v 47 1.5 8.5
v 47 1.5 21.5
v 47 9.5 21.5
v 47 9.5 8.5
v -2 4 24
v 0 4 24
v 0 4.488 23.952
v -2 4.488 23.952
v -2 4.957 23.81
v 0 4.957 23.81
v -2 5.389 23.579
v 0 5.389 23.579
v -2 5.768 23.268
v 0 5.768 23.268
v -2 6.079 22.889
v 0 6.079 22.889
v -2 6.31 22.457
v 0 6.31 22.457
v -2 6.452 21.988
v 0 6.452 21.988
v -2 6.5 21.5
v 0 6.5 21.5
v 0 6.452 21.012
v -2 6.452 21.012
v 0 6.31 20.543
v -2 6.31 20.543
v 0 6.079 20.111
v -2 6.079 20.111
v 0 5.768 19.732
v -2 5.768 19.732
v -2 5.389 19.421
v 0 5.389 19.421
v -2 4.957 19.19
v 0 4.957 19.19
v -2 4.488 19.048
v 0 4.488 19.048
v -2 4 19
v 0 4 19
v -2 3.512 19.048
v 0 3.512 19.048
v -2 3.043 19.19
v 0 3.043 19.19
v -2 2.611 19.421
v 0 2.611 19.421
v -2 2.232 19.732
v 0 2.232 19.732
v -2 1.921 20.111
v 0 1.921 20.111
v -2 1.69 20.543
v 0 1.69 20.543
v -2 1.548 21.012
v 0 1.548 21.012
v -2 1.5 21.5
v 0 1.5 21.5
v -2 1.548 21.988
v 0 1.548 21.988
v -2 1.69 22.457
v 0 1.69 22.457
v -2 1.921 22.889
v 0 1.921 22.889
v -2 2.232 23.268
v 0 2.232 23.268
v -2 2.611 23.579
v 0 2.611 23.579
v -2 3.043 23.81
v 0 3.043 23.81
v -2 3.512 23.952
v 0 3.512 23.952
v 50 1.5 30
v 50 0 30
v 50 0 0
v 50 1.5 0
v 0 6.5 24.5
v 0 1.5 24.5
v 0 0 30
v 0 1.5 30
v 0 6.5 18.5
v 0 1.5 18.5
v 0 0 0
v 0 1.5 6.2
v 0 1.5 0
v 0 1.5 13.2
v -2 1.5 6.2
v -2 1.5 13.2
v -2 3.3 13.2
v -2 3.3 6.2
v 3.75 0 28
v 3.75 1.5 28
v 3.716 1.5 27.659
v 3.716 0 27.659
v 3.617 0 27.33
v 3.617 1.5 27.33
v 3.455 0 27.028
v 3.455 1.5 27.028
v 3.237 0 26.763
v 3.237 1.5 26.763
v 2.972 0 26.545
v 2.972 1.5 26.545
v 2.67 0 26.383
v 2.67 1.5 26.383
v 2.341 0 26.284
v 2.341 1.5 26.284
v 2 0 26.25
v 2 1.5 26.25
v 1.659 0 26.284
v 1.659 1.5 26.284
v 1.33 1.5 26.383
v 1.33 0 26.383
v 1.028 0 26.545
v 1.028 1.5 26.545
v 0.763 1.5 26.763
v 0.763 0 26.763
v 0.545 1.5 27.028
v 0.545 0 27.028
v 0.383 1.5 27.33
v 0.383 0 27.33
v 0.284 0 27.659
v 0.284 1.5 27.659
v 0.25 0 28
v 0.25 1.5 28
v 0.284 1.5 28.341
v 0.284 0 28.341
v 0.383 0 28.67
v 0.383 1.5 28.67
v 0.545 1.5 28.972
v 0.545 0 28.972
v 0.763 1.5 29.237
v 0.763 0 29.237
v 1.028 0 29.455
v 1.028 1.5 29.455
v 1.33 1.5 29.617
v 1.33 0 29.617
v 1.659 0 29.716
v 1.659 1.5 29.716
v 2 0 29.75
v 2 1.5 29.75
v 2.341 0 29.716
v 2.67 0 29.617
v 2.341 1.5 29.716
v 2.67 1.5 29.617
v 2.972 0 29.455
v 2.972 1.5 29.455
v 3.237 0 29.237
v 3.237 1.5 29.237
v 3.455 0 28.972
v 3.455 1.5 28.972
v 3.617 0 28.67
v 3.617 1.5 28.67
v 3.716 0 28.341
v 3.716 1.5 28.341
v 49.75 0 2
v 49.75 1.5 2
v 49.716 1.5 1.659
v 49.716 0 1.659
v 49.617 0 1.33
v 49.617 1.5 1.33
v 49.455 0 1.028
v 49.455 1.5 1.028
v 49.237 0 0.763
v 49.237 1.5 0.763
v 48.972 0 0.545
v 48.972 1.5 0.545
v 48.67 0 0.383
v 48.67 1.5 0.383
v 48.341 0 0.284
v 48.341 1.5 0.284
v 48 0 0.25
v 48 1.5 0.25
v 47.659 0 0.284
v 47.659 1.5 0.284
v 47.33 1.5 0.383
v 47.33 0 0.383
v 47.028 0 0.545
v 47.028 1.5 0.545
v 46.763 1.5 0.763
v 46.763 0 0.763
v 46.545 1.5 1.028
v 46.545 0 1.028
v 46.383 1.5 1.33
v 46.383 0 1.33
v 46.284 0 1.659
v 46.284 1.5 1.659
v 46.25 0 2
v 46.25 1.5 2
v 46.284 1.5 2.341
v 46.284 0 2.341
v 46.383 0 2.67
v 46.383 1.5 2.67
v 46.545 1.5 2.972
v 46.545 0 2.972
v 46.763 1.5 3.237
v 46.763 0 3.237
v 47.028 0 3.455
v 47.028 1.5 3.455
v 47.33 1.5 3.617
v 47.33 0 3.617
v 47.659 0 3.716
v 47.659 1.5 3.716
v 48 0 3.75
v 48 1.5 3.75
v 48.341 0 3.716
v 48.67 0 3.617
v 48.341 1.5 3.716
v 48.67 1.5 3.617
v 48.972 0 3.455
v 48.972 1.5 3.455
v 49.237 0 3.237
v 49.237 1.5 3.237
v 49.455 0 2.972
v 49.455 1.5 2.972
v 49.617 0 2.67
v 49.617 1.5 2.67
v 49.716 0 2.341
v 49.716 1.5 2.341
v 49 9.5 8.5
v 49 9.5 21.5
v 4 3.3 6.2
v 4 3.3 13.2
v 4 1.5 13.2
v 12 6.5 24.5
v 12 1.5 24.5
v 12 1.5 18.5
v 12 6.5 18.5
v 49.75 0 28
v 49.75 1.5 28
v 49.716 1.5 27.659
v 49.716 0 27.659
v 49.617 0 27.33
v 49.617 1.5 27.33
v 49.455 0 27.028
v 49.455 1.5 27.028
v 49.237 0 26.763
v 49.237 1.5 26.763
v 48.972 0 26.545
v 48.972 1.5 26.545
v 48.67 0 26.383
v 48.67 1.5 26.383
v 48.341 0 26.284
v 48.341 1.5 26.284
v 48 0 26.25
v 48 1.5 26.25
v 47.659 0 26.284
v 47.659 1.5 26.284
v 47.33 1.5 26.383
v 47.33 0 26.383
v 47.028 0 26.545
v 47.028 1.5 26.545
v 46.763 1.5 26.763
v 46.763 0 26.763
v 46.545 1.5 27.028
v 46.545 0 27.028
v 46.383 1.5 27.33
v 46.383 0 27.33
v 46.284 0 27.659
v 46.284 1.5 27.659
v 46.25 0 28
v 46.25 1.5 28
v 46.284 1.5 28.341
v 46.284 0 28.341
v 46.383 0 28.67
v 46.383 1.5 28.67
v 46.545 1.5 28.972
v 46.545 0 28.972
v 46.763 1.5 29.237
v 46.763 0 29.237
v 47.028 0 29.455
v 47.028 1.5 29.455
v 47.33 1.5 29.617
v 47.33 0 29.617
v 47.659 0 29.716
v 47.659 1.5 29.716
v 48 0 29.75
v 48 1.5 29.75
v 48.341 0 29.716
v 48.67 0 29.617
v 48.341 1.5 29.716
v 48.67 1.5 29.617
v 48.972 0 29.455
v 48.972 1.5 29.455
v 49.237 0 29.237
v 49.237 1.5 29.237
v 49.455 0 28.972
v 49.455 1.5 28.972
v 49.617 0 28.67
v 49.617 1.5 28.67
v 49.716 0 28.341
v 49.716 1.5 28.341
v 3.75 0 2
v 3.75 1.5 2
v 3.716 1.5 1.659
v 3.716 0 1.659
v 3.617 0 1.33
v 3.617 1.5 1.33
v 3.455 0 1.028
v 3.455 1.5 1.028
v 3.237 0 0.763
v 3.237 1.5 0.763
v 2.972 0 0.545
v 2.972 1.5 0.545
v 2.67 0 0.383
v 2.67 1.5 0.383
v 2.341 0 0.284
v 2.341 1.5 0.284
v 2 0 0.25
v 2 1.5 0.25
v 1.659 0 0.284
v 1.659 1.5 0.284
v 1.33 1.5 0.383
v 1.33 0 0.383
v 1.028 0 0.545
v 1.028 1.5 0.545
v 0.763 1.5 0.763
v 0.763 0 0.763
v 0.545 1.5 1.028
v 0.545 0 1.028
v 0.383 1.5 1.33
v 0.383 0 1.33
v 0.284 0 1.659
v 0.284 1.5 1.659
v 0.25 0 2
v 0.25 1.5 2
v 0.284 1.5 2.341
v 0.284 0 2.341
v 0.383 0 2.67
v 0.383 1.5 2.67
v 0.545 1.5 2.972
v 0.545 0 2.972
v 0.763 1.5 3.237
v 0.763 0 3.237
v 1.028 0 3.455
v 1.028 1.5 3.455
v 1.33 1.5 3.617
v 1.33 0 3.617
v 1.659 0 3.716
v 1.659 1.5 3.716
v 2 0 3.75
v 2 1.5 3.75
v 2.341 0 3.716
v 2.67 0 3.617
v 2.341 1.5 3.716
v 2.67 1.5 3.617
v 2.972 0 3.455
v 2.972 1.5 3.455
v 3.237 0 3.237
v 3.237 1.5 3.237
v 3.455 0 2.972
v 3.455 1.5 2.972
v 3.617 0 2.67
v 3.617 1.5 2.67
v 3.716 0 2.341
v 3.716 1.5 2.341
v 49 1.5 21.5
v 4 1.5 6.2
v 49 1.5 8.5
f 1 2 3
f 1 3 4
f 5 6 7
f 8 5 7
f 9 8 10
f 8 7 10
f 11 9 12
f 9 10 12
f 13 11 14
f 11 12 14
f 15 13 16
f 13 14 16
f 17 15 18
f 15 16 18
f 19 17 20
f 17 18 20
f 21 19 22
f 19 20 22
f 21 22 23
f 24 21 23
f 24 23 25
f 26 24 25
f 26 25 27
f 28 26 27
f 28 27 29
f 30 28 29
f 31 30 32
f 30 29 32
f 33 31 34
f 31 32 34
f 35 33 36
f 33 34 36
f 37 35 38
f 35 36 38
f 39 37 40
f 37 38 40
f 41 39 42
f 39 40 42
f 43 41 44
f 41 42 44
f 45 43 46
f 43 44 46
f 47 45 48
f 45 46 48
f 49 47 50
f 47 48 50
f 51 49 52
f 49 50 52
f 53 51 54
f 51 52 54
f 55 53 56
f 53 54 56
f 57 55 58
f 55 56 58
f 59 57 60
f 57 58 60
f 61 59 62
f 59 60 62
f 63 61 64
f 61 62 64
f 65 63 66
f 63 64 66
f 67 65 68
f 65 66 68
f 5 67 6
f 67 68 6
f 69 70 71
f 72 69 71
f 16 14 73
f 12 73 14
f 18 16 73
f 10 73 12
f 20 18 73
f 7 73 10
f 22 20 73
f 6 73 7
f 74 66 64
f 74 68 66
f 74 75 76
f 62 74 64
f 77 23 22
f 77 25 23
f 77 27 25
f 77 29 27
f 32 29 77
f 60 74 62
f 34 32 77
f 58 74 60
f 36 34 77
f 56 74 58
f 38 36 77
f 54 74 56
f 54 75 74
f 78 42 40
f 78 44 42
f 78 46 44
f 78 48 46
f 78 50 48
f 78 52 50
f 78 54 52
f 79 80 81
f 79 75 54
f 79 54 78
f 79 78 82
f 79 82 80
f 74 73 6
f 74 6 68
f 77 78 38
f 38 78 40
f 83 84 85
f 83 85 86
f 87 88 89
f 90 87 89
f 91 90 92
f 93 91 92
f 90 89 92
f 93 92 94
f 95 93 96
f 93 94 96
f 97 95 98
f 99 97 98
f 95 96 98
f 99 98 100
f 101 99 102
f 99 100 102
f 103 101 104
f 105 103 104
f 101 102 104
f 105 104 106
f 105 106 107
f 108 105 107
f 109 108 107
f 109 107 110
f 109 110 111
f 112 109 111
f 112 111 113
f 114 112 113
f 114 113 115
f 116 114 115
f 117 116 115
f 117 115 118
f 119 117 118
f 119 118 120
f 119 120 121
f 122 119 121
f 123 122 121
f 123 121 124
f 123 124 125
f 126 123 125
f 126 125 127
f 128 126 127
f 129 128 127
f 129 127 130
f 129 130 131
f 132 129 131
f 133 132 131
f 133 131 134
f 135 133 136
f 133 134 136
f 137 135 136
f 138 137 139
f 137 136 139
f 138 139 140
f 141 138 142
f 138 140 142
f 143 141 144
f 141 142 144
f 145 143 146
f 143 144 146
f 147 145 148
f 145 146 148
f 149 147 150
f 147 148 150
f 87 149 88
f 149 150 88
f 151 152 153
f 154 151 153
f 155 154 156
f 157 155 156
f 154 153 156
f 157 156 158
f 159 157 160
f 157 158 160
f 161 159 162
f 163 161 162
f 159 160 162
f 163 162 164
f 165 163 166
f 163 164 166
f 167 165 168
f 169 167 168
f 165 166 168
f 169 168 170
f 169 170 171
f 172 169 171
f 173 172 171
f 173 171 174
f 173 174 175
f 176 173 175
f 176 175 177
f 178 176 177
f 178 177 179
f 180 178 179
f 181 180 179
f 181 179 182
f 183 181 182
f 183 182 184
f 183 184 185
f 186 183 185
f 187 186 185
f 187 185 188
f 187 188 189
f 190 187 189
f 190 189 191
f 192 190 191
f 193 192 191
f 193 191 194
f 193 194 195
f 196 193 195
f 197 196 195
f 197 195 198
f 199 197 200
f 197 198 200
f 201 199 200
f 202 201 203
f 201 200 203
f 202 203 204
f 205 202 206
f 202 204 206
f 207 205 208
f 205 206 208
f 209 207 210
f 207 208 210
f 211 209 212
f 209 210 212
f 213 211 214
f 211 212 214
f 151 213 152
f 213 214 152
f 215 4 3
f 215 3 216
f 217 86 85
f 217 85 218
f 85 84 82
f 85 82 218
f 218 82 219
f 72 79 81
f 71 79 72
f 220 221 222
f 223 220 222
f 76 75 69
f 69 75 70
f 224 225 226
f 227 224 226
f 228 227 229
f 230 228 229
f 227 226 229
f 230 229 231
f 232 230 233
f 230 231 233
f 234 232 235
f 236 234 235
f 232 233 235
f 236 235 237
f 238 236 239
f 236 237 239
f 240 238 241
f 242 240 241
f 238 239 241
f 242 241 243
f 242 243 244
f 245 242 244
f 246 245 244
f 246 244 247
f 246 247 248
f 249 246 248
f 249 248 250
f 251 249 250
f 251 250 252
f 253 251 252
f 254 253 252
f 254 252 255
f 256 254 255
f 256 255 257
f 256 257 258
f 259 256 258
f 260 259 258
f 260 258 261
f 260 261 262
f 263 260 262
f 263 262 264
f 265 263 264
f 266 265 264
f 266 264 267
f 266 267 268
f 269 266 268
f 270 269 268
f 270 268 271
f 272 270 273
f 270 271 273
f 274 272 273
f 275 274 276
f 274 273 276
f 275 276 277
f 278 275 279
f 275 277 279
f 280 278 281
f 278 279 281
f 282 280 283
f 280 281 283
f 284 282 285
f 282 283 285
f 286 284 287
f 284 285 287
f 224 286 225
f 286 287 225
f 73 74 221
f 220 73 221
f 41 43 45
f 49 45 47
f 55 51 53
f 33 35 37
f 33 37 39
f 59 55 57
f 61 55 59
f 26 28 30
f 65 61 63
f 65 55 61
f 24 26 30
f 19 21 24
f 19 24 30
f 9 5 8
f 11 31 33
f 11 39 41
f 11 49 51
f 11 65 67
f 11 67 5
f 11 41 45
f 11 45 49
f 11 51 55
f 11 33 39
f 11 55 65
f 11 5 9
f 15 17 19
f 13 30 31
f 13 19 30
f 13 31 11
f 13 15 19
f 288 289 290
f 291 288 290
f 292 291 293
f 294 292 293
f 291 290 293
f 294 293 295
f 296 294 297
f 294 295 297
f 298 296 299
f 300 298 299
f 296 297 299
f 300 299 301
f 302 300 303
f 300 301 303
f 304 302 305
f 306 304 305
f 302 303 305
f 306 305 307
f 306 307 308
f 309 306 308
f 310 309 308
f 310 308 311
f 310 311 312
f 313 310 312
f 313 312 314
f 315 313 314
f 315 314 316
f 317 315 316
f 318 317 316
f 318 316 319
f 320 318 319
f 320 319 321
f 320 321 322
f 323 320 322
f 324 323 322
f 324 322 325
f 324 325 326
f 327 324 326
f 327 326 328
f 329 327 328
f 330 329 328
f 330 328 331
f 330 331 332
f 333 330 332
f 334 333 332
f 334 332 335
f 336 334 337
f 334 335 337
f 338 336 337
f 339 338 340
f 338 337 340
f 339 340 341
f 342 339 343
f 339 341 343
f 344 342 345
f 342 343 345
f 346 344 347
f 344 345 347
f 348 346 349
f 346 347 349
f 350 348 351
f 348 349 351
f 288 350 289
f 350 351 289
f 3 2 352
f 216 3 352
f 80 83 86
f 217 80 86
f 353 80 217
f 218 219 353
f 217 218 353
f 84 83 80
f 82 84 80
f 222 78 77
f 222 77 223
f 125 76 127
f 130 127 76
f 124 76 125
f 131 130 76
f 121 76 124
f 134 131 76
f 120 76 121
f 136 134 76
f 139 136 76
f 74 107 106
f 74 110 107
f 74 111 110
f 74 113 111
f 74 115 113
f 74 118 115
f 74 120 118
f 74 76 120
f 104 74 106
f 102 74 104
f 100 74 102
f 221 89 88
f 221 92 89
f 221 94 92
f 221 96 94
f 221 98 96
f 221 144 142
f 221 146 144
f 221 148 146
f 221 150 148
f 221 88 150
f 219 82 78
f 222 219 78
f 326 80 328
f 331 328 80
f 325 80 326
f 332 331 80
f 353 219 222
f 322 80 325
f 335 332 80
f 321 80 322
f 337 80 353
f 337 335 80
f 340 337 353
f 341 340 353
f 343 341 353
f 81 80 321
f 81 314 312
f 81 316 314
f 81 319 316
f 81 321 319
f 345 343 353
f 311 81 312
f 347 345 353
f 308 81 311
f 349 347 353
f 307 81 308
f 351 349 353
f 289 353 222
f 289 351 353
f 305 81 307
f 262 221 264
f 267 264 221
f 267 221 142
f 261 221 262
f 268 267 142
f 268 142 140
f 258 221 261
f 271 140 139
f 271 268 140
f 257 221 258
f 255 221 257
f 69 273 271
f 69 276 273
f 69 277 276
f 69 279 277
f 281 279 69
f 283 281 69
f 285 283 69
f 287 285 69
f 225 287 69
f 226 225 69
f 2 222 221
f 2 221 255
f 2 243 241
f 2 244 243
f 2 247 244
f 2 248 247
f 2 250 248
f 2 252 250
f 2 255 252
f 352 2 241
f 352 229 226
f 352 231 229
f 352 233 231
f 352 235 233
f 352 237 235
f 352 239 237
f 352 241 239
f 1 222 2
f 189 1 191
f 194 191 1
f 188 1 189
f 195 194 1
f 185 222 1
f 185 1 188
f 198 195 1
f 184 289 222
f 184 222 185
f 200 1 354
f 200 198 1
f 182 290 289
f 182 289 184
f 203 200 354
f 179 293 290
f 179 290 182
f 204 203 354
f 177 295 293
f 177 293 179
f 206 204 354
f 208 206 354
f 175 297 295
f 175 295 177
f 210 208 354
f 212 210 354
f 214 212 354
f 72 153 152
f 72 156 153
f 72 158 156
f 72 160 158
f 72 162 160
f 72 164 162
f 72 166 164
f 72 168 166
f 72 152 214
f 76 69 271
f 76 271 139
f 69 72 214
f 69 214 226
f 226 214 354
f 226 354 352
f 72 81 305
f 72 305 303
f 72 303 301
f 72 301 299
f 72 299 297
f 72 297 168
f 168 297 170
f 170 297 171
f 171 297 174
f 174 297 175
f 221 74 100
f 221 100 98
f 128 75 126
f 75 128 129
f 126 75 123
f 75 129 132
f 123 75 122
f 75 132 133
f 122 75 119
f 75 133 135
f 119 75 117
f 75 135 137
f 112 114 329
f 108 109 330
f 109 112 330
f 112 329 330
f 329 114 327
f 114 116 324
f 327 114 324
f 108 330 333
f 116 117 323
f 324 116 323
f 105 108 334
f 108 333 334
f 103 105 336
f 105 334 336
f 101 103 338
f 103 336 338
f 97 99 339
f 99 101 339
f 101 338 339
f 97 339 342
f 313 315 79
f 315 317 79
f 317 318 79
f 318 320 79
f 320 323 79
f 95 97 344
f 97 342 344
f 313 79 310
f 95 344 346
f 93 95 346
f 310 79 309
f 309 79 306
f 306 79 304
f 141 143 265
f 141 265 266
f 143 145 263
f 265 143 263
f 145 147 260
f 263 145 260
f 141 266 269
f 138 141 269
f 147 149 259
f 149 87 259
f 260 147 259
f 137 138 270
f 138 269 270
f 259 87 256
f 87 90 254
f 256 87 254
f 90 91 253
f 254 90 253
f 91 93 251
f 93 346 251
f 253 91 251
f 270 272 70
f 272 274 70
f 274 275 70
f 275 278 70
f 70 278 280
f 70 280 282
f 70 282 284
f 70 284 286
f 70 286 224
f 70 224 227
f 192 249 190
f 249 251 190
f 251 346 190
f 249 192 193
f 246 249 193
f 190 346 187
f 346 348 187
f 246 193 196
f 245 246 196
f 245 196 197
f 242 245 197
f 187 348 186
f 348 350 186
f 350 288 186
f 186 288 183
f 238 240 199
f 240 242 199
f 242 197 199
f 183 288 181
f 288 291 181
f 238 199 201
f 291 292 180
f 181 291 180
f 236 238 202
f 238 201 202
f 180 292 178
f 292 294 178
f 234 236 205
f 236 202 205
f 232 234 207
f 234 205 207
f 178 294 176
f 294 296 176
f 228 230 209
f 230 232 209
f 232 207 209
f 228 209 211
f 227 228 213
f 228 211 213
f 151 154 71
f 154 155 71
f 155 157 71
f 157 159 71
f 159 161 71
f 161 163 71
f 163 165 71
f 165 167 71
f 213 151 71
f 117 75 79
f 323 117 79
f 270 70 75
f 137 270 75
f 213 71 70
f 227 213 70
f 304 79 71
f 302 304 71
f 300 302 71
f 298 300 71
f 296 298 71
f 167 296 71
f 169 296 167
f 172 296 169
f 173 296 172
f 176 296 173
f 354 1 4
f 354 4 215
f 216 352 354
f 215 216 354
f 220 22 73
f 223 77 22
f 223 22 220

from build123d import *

# Parameters (mm, degrees)
SKETCH1_W           = 50
SKETCH1_H           = 30
BOSS_EXTRUDE1_DEPTH = 1.5
SKETCH2_R           = 1.75
CUT_EXTRUDE1_DEPTH  = 2.5
SKETCH3_W           = 2
SKETCH3_H           = 13
BOSS_EXTRUDE2_DEPTH = 8
SKETCH4_W           = 12
SKETCH4_H           = 6
BOSS_EXTRUDE3_DEPTH = 5
SKETCH5_R           = 2.5
BOSS_EXTRUDE4_DEPTH = 2
SKETCH6_W           = 6
SKETCH6_H           = 7
BOSS_EXTRUDE5_DEPTH = 1.8


with BuildPart() as part:
    # Sketch1 → Boss-Extrude1 (new body)
    with BuildSketch(Plane(origin=(0, 0, 0), x_dir=(1, 0, 0), z_dir=(0, 1, 0))):
        with Locations((25, -15)):
            Rectangle(SKETCH1_W, SKETCH1_H)
    extrude(amount=BOSS_EXTRUDE1_DEPTH)

    # Sketch2 → Cut-Extrude1 (cut, through all)
    with BuildSketch(Plane(origin=(0, 1.5, 0), x_dir=(1, 0, 0), z_dir=(0, 1, 0))):
        with Locations((48, -28)):
            Circle(SKETCH2_R)
        with Locations((48, -2)):
            Circle(SKETCH2_R)
        with Locations((2, -2)):
            Circle(SKETCH2_R)
        with Locations((2, -28)):
            Circle(SKETCH2_R)
    extrude(amount=-CUT_EXTRUDE1_DEPTH, mode=Mode.SUBTRACT)

    # Sketch3 → Boss-Extrude2 (add)
    with BuildSketch(Plane(origin=(0, 1.5, 0), x_dir=(1, 0, 0), z_dir=(0, 1, 0))):
        with Locations((48, -15)):
            Rectangle(SKETCH3_W, SKETCH3_H)
    extrude(amount=BOSS_EXTRUDE2_DEPTH)

    # Sketch4 → Boss-Extrude3 (add)
    with BuildSketch(Plane(origin=(0, 1.5, 0), x_dir=(1, 0, 0), z_dir=(0, 1, 0))):
        with Locations((6, -21.5)):
            Rectangle(SKETCH4_W, SKETCH4_H)
    extrude(amount=BOSS_EXTRUDE3_DEPTH)

    # Sketch5 → Boss-Extrude4 (add)
    with BuildSketch(Plane.ZY):
        with Locations((21.5, 4)):
            Circle(SKETCH5_R)
    extrude(amount=BOSS_EXTRUDE4_DEPTH)

    # Sketch6 → Boss-Extrude5 (add)
    with BuildSketch(Plane(origin=(0, 1.5, 0), x_dir=(1, 0, 0), z_dir=(0, 1, 0))):
        with Locations((1, -9.7)):
            Rectangle(SKETCH6_W, SKETCH6_H)
    extrude(amount=BOSS_EXTRUDE5_DEPTH)


solid = part.part
